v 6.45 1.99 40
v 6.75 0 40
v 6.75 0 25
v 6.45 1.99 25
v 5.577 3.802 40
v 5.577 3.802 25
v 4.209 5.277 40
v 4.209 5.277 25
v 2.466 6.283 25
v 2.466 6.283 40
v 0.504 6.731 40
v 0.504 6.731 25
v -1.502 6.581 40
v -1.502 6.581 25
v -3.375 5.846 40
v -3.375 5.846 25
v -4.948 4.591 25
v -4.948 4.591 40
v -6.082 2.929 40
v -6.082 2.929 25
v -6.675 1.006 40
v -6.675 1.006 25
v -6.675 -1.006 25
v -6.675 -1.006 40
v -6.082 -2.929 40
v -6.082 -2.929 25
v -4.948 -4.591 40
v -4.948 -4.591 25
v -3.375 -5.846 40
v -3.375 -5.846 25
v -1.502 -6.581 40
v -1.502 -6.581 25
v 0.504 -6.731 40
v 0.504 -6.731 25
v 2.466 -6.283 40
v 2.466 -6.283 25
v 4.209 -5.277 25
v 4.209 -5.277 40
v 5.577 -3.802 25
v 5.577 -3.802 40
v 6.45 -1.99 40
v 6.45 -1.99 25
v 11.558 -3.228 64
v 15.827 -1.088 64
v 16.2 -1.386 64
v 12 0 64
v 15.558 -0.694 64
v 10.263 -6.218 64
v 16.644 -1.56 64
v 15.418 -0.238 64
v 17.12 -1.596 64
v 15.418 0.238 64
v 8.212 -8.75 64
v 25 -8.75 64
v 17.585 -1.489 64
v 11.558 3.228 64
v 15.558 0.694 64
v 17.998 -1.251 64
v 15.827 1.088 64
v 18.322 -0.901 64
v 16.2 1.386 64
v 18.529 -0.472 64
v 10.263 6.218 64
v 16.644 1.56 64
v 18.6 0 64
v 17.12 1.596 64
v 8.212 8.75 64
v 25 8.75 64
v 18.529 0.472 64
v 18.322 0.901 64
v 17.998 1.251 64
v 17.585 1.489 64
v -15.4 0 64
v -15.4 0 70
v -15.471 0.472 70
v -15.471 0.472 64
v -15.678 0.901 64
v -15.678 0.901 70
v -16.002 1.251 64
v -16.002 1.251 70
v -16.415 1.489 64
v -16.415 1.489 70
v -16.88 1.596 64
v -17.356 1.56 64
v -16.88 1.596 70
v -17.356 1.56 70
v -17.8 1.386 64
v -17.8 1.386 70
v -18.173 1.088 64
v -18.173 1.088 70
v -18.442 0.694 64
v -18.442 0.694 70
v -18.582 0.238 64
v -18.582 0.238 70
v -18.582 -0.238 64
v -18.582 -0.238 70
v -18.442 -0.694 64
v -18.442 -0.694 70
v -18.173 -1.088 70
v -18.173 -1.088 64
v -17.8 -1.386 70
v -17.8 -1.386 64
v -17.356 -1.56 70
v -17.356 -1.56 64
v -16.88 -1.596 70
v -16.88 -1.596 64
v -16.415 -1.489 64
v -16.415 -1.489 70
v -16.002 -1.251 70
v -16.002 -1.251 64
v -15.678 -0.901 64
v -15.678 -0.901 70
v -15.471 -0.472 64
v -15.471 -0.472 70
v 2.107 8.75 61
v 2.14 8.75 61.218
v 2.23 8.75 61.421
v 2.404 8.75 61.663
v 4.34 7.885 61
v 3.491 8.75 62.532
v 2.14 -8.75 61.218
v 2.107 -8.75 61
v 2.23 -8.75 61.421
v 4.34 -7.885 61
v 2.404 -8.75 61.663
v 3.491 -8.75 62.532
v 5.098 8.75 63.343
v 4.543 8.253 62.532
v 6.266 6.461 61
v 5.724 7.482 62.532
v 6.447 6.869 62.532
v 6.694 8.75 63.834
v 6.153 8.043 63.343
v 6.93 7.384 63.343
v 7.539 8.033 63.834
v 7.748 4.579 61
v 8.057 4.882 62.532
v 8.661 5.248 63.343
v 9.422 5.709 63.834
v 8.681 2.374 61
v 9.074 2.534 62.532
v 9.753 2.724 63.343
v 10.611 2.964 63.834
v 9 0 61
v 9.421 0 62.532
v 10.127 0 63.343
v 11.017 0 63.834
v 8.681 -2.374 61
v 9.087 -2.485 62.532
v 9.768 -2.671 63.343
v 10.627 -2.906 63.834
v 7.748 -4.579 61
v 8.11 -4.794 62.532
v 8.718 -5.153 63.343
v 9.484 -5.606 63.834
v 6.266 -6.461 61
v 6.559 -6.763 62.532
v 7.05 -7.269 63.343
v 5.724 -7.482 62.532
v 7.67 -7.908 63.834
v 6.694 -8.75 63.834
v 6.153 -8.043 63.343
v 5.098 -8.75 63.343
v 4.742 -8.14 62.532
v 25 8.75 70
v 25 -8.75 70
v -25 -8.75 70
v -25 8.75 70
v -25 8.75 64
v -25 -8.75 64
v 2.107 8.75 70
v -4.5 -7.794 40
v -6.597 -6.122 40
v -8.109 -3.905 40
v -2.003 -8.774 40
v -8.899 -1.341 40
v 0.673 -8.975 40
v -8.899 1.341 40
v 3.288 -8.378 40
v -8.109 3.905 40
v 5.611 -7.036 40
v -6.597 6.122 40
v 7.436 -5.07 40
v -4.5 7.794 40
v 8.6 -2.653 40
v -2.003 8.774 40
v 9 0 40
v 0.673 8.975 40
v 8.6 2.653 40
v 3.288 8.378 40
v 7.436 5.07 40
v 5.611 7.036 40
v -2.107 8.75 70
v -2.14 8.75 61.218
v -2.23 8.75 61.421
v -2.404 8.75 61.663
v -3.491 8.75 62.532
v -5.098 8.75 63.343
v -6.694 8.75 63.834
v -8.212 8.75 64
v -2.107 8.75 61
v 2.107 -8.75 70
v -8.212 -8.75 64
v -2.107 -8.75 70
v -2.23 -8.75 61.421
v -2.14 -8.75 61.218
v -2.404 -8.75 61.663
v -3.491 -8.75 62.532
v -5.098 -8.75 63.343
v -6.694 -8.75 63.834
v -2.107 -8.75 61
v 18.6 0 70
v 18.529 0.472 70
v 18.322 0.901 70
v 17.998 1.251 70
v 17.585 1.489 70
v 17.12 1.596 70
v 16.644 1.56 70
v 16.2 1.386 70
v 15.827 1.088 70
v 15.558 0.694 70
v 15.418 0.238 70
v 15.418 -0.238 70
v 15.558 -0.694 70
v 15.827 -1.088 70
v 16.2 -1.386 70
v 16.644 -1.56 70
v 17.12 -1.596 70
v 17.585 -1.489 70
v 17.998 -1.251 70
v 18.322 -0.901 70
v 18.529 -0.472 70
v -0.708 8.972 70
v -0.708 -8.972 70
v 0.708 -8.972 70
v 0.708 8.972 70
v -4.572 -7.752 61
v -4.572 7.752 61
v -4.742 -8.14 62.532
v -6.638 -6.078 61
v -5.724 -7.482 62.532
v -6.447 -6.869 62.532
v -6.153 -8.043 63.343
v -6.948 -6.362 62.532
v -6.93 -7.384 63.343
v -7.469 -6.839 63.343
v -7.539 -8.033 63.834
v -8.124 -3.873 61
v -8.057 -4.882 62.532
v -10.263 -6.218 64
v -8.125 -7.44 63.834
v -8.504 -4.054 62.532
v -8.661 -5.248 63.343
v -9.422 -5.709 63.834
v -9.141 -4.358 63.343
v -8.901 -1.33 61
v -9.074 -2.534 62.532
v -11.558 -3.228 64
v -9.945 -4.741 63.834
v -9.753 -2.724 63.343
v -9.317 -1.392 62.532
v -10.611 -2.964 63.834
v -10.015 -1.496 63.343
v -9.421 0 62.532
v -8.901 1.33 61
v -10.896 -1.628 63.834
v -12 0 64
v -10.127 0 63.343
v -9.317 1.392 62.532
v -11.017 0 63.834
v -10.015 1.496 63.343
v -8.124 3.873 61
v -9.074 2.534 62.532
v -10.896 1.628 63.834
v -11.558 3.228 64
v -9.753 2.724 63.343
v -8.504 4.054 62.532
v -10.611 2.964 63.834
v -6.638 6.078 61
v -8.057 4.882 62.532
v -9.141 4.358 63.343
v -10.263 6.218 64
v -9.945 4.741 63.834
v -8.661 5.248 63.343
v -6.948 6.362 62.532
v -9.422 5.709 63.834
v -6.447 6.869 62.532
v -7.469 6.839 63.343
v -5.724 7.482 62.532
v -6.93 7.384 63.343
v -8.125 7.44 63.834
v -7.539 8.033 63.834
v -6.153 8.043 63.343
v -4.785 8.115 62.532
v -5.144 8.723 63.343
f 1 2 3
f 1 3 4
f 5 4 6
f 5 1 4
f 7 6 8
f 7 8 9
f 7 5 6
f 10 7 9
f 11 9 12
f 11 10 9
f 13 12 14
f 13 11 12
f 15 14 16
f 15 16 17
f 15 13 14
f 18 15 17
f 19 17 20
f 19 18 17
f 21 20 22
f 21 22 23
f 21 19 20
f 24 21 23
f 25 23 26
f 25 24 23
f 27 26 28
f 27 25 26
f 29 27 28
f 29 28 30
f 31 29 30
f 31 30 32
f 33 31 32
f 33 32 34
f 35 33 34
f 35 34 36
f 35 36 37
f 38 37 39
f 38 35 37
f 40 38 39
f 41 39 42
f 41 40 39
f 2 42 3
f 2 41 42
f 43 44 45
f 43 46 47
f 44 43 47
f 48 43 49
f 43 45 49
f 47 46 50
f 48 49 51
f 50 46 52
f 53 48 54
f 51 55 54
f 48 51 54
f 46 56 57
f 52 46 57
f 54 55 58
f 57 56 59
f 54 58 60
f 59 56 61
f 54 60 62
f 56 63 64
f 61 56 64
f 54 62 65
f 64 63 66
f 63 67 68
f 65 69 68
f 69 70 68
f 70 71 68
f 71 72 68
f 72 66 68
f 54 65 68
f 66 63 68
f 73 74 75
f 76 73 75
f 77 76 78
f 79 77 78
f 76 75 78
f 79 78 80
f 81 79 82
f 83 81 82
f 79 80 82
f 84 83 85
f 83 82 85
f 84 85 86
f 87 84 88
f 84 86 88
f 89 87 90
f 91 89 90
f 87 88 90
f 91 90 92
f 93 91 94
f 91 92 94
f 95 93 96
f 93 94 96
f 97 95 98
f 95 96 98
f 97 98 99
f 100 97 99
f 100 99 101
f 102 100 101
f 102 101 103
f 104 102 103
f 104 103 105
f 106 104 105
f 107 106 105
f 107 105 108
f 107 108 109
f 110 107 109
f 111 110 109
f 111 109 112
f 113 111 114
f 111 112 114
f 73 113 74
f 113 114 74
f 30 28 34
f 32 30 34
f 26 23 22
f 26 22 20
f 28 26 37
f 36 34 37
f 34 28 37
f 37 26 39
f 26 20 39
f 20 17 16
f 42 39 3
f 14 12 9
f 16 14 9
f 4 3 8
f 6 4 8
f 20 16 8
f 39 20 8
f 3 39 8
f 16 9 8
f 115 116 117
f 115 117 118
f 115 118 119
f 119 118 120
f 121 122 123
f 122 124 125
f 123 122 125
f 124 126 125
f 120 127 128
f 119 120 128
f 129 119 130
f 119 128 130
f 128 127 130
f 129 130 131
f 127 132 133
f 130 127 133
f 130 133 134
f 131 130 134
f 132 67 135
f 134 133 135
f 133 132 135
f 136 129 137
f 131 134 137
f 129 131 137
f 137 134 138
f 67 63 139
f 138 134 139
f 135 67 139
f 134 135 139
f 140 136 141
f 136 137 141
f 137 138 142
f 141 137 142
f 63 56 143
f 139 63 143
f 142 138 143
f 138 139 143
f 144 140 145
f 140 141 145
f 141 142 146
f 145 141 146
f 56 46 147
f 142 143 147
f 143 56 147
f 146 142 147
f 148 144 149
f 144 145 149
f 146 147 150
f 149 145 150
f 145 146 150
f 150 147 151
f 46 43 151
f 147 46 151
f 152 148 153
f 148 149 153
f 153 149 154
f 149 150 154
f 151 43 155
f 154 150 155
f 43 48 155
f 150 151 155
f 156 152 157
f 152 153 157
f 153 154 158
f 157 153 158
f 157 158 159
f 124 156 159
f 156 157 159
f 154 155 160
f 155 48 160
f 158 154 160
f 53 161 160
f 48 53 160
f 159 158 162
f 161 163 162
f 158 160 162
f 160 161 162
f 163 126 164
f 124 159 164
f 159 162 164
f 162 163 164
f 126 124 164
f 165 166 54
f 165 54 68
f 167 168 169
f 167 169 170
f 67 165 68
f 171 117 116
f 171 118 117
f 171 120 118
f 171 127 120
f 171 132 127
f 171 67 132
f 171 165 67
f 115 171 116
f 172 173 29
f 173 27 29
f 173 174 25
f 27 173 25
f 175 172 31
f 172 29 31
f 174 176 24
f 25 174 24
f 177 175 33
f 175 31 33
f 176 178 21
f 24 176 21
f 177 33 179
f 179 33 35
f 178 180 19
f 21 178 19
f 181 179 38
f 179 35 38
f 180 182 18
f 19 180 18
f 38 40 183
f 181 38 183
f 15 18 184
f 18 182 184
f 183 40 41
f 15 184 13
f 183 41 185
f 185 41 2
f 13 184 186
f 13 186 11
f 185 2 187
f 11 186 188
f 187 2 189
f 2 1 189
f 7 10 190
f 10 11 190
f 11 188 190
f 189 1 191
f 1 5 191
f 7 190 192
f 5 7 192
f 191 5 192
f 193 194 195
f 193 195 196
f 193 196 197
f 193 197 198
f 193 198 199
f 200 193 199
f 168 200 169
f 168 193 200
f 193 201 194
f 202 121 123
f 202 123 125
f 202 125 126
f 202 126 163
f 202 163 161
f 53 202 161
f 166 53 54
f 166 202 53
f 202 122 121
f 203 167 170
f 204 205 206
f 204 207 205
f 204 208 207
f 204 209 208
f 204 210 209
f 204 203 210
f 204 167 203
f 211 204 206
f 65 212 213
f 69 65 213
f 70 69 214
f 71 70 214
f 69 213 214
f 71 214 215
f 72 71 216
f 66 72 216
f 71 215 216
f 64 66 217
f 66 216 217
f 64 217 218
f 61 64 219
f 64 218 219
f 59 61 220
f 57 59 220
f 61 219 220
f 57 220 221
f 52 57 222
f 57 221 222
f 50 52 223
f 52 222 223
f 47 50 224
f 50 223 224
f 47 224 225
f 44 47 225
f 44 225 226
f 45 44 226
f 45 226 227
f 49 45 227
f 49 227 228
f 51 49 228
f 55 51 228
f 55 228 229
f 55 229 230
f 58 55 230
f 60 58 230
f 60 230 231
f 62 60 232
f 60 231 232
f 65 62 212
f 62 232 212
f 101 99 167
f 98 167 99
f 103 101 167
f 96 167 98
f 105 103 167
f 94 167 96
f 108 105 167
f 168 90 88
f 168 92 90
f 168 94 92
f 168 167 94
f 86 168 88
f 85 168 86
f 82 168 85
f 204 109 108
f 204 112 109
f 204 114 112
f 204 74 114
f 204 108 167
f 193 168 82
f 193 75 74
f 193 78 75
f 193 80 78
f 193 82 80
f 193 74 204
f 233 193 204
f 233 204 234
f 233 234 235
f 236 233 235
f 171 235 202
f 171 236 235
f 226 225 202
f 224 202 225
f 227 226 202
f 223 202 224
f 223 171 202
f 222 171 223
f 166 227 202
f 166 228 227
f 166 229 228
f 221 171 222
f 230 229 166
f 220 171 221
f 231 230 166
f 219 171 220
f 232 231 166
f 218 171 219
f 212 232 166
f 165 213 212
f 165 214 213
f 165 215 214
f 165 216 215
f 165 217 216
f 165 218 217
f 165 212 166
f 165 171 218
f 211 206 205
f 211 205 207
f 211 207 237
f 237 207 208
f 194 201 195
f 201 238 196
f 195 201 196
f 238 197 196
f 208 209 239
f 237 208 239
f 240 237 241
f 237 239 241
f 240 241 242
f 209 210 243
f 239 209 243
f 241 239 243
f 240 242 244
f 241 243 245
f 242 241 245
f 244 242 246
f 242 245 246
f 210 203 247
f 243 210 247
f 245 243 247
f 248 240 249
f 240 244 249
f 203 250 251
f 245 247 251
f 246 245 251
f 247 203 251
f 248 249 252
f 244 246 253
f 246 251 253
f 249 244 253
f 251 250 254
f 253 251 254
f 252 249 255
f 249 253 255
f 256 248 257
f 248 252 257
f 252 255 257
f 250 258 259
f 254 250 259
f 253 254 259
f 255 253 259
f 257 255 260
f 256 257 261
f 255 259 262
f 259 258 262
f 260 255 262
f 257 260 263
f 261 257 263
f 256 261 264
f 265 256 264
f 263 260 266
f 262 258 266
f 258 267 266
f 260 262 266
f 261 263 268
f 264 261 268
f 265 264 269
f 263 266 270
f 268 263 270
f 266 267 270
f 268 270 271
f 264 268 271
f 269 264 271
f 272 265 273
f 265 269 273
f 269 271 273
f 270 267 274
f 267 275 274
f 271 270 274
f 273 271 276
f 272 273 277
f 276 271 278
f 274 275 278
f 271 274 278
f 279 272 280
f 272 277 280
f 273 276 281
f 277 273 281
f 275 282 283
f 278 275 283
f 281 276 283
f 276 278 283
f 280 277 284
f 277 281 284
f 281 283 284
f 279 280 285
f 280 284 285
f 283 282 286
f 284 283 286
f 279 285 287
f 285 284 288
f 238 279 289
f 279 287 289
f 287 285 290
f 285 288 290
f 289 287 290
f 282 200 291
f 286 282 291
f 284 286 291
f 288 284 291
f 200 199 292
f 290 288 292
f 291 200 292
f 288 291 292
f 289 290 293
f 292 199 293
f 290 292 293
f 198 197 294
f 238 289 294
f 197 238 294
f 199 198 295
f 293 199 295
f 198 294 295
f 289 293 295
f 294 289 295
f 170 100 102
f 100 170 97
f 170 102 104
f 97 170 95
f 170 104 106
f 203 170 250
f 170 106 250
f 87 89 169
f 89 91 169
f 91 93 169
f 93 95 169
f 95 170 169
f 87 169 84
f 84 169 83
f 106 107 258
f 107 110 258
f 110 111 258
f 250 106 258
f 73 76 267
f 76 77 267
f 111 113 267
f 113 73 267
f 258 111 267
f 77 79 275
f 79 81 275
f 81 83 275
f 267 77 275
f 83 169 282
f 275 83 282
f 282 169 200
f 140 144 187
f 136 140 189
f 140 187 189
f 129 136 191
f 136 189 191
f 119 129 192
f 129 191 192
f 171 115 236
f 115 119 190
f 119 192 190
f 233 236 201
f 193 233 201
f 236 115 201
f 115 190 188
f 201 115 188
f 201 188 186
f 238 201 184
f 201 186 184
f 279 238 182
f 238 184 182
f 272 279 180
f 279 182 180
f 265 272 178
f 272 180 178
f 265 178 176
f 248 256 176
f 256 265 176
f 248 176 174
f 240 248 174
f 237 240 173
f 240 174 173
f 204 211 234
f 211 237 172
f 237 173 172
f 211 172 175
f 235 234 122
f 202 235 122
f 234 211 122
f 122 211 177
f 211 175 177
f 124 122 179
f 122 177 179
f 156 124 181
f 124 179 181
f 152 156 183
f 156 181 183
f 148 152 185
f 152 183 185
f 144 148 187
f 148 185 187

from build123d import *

# Parameters (mm, degrees)
F1_R     = 6.75
F2_DEPTH = 15
F3_R     = 9
F4_DEPTH = 30
F5_R     = 1.6
F6_DEPTH = 6
F7_R     = 3


with BuildPart() as f2:
    # F1 (on offset) → F2 (new body)
    with BuildSketch(Plane.XY.offset(40)):
        Circle(F1_R)
    extrude(amount=-F2_DEPTH)

    # F3 (on offset) → F4 (join)
    with BuildSketch(Plane.XY.offset(40)):
        Circle(F3_R)
    extrude(amount=F4_DEPTH)

    # F5 (on face) → F6 (join)
    with BuildSketch(Plane.XY.offset(70)):
        with BuildLine():
            Line((-2.1065374433, 8.75), (-25, 8.75))
            Line((-25, 8.75), (-25, -8.75))
            Line((-25, -8.75), (-2.1065374433, -8.75))
            ThreePointArc((-2.1065374433, -8.75), (-9, 0), (-2.1065374433, 8.75))
        make_face()
        with Locations((-17, 0)):
            Circle(F5_R, mode=Mode.SUBTRACT)
        with BuildLine():
            Line((25, 8.75), (2.1065374433, 8.75))
            ThreePointArc((2.1065374433, 8.75), (7.0696123299, 5.5696123299), (9, 0))
            ThreePointArc((9, 0), (7.0696123299, -5.5696123299), (2.1065374433, -8.75))
            Line((2.1065374433, -8.75), (25, -8.75))
            Line((25, -8.75), (25, 8.75))
        make_face()
        with Locations((17, 0)):
            Circle(F5_R, mode=Mode.SUBTRACT)
        with BuildLine():
            Line((2.1065374433, -8.75), (-2.1065374433, -8.75))
            ThreePointArc((-2.1065374433, -8.75), (0, -9), (2.1065374433, -8.75))
        make_face()
    extrude(amount=-F6_DEPTH)

    # F7
    f7_edges = [f2.edges().sort_by_distance(p)[0] for p in [
        (7.069612, 5.569612, 64),
        (-9, 0, 64),
        (7.069612, -5.569612, 64),
    ]]
    fillet(f7_edges, radius=F7_R)


solid = f2.part
